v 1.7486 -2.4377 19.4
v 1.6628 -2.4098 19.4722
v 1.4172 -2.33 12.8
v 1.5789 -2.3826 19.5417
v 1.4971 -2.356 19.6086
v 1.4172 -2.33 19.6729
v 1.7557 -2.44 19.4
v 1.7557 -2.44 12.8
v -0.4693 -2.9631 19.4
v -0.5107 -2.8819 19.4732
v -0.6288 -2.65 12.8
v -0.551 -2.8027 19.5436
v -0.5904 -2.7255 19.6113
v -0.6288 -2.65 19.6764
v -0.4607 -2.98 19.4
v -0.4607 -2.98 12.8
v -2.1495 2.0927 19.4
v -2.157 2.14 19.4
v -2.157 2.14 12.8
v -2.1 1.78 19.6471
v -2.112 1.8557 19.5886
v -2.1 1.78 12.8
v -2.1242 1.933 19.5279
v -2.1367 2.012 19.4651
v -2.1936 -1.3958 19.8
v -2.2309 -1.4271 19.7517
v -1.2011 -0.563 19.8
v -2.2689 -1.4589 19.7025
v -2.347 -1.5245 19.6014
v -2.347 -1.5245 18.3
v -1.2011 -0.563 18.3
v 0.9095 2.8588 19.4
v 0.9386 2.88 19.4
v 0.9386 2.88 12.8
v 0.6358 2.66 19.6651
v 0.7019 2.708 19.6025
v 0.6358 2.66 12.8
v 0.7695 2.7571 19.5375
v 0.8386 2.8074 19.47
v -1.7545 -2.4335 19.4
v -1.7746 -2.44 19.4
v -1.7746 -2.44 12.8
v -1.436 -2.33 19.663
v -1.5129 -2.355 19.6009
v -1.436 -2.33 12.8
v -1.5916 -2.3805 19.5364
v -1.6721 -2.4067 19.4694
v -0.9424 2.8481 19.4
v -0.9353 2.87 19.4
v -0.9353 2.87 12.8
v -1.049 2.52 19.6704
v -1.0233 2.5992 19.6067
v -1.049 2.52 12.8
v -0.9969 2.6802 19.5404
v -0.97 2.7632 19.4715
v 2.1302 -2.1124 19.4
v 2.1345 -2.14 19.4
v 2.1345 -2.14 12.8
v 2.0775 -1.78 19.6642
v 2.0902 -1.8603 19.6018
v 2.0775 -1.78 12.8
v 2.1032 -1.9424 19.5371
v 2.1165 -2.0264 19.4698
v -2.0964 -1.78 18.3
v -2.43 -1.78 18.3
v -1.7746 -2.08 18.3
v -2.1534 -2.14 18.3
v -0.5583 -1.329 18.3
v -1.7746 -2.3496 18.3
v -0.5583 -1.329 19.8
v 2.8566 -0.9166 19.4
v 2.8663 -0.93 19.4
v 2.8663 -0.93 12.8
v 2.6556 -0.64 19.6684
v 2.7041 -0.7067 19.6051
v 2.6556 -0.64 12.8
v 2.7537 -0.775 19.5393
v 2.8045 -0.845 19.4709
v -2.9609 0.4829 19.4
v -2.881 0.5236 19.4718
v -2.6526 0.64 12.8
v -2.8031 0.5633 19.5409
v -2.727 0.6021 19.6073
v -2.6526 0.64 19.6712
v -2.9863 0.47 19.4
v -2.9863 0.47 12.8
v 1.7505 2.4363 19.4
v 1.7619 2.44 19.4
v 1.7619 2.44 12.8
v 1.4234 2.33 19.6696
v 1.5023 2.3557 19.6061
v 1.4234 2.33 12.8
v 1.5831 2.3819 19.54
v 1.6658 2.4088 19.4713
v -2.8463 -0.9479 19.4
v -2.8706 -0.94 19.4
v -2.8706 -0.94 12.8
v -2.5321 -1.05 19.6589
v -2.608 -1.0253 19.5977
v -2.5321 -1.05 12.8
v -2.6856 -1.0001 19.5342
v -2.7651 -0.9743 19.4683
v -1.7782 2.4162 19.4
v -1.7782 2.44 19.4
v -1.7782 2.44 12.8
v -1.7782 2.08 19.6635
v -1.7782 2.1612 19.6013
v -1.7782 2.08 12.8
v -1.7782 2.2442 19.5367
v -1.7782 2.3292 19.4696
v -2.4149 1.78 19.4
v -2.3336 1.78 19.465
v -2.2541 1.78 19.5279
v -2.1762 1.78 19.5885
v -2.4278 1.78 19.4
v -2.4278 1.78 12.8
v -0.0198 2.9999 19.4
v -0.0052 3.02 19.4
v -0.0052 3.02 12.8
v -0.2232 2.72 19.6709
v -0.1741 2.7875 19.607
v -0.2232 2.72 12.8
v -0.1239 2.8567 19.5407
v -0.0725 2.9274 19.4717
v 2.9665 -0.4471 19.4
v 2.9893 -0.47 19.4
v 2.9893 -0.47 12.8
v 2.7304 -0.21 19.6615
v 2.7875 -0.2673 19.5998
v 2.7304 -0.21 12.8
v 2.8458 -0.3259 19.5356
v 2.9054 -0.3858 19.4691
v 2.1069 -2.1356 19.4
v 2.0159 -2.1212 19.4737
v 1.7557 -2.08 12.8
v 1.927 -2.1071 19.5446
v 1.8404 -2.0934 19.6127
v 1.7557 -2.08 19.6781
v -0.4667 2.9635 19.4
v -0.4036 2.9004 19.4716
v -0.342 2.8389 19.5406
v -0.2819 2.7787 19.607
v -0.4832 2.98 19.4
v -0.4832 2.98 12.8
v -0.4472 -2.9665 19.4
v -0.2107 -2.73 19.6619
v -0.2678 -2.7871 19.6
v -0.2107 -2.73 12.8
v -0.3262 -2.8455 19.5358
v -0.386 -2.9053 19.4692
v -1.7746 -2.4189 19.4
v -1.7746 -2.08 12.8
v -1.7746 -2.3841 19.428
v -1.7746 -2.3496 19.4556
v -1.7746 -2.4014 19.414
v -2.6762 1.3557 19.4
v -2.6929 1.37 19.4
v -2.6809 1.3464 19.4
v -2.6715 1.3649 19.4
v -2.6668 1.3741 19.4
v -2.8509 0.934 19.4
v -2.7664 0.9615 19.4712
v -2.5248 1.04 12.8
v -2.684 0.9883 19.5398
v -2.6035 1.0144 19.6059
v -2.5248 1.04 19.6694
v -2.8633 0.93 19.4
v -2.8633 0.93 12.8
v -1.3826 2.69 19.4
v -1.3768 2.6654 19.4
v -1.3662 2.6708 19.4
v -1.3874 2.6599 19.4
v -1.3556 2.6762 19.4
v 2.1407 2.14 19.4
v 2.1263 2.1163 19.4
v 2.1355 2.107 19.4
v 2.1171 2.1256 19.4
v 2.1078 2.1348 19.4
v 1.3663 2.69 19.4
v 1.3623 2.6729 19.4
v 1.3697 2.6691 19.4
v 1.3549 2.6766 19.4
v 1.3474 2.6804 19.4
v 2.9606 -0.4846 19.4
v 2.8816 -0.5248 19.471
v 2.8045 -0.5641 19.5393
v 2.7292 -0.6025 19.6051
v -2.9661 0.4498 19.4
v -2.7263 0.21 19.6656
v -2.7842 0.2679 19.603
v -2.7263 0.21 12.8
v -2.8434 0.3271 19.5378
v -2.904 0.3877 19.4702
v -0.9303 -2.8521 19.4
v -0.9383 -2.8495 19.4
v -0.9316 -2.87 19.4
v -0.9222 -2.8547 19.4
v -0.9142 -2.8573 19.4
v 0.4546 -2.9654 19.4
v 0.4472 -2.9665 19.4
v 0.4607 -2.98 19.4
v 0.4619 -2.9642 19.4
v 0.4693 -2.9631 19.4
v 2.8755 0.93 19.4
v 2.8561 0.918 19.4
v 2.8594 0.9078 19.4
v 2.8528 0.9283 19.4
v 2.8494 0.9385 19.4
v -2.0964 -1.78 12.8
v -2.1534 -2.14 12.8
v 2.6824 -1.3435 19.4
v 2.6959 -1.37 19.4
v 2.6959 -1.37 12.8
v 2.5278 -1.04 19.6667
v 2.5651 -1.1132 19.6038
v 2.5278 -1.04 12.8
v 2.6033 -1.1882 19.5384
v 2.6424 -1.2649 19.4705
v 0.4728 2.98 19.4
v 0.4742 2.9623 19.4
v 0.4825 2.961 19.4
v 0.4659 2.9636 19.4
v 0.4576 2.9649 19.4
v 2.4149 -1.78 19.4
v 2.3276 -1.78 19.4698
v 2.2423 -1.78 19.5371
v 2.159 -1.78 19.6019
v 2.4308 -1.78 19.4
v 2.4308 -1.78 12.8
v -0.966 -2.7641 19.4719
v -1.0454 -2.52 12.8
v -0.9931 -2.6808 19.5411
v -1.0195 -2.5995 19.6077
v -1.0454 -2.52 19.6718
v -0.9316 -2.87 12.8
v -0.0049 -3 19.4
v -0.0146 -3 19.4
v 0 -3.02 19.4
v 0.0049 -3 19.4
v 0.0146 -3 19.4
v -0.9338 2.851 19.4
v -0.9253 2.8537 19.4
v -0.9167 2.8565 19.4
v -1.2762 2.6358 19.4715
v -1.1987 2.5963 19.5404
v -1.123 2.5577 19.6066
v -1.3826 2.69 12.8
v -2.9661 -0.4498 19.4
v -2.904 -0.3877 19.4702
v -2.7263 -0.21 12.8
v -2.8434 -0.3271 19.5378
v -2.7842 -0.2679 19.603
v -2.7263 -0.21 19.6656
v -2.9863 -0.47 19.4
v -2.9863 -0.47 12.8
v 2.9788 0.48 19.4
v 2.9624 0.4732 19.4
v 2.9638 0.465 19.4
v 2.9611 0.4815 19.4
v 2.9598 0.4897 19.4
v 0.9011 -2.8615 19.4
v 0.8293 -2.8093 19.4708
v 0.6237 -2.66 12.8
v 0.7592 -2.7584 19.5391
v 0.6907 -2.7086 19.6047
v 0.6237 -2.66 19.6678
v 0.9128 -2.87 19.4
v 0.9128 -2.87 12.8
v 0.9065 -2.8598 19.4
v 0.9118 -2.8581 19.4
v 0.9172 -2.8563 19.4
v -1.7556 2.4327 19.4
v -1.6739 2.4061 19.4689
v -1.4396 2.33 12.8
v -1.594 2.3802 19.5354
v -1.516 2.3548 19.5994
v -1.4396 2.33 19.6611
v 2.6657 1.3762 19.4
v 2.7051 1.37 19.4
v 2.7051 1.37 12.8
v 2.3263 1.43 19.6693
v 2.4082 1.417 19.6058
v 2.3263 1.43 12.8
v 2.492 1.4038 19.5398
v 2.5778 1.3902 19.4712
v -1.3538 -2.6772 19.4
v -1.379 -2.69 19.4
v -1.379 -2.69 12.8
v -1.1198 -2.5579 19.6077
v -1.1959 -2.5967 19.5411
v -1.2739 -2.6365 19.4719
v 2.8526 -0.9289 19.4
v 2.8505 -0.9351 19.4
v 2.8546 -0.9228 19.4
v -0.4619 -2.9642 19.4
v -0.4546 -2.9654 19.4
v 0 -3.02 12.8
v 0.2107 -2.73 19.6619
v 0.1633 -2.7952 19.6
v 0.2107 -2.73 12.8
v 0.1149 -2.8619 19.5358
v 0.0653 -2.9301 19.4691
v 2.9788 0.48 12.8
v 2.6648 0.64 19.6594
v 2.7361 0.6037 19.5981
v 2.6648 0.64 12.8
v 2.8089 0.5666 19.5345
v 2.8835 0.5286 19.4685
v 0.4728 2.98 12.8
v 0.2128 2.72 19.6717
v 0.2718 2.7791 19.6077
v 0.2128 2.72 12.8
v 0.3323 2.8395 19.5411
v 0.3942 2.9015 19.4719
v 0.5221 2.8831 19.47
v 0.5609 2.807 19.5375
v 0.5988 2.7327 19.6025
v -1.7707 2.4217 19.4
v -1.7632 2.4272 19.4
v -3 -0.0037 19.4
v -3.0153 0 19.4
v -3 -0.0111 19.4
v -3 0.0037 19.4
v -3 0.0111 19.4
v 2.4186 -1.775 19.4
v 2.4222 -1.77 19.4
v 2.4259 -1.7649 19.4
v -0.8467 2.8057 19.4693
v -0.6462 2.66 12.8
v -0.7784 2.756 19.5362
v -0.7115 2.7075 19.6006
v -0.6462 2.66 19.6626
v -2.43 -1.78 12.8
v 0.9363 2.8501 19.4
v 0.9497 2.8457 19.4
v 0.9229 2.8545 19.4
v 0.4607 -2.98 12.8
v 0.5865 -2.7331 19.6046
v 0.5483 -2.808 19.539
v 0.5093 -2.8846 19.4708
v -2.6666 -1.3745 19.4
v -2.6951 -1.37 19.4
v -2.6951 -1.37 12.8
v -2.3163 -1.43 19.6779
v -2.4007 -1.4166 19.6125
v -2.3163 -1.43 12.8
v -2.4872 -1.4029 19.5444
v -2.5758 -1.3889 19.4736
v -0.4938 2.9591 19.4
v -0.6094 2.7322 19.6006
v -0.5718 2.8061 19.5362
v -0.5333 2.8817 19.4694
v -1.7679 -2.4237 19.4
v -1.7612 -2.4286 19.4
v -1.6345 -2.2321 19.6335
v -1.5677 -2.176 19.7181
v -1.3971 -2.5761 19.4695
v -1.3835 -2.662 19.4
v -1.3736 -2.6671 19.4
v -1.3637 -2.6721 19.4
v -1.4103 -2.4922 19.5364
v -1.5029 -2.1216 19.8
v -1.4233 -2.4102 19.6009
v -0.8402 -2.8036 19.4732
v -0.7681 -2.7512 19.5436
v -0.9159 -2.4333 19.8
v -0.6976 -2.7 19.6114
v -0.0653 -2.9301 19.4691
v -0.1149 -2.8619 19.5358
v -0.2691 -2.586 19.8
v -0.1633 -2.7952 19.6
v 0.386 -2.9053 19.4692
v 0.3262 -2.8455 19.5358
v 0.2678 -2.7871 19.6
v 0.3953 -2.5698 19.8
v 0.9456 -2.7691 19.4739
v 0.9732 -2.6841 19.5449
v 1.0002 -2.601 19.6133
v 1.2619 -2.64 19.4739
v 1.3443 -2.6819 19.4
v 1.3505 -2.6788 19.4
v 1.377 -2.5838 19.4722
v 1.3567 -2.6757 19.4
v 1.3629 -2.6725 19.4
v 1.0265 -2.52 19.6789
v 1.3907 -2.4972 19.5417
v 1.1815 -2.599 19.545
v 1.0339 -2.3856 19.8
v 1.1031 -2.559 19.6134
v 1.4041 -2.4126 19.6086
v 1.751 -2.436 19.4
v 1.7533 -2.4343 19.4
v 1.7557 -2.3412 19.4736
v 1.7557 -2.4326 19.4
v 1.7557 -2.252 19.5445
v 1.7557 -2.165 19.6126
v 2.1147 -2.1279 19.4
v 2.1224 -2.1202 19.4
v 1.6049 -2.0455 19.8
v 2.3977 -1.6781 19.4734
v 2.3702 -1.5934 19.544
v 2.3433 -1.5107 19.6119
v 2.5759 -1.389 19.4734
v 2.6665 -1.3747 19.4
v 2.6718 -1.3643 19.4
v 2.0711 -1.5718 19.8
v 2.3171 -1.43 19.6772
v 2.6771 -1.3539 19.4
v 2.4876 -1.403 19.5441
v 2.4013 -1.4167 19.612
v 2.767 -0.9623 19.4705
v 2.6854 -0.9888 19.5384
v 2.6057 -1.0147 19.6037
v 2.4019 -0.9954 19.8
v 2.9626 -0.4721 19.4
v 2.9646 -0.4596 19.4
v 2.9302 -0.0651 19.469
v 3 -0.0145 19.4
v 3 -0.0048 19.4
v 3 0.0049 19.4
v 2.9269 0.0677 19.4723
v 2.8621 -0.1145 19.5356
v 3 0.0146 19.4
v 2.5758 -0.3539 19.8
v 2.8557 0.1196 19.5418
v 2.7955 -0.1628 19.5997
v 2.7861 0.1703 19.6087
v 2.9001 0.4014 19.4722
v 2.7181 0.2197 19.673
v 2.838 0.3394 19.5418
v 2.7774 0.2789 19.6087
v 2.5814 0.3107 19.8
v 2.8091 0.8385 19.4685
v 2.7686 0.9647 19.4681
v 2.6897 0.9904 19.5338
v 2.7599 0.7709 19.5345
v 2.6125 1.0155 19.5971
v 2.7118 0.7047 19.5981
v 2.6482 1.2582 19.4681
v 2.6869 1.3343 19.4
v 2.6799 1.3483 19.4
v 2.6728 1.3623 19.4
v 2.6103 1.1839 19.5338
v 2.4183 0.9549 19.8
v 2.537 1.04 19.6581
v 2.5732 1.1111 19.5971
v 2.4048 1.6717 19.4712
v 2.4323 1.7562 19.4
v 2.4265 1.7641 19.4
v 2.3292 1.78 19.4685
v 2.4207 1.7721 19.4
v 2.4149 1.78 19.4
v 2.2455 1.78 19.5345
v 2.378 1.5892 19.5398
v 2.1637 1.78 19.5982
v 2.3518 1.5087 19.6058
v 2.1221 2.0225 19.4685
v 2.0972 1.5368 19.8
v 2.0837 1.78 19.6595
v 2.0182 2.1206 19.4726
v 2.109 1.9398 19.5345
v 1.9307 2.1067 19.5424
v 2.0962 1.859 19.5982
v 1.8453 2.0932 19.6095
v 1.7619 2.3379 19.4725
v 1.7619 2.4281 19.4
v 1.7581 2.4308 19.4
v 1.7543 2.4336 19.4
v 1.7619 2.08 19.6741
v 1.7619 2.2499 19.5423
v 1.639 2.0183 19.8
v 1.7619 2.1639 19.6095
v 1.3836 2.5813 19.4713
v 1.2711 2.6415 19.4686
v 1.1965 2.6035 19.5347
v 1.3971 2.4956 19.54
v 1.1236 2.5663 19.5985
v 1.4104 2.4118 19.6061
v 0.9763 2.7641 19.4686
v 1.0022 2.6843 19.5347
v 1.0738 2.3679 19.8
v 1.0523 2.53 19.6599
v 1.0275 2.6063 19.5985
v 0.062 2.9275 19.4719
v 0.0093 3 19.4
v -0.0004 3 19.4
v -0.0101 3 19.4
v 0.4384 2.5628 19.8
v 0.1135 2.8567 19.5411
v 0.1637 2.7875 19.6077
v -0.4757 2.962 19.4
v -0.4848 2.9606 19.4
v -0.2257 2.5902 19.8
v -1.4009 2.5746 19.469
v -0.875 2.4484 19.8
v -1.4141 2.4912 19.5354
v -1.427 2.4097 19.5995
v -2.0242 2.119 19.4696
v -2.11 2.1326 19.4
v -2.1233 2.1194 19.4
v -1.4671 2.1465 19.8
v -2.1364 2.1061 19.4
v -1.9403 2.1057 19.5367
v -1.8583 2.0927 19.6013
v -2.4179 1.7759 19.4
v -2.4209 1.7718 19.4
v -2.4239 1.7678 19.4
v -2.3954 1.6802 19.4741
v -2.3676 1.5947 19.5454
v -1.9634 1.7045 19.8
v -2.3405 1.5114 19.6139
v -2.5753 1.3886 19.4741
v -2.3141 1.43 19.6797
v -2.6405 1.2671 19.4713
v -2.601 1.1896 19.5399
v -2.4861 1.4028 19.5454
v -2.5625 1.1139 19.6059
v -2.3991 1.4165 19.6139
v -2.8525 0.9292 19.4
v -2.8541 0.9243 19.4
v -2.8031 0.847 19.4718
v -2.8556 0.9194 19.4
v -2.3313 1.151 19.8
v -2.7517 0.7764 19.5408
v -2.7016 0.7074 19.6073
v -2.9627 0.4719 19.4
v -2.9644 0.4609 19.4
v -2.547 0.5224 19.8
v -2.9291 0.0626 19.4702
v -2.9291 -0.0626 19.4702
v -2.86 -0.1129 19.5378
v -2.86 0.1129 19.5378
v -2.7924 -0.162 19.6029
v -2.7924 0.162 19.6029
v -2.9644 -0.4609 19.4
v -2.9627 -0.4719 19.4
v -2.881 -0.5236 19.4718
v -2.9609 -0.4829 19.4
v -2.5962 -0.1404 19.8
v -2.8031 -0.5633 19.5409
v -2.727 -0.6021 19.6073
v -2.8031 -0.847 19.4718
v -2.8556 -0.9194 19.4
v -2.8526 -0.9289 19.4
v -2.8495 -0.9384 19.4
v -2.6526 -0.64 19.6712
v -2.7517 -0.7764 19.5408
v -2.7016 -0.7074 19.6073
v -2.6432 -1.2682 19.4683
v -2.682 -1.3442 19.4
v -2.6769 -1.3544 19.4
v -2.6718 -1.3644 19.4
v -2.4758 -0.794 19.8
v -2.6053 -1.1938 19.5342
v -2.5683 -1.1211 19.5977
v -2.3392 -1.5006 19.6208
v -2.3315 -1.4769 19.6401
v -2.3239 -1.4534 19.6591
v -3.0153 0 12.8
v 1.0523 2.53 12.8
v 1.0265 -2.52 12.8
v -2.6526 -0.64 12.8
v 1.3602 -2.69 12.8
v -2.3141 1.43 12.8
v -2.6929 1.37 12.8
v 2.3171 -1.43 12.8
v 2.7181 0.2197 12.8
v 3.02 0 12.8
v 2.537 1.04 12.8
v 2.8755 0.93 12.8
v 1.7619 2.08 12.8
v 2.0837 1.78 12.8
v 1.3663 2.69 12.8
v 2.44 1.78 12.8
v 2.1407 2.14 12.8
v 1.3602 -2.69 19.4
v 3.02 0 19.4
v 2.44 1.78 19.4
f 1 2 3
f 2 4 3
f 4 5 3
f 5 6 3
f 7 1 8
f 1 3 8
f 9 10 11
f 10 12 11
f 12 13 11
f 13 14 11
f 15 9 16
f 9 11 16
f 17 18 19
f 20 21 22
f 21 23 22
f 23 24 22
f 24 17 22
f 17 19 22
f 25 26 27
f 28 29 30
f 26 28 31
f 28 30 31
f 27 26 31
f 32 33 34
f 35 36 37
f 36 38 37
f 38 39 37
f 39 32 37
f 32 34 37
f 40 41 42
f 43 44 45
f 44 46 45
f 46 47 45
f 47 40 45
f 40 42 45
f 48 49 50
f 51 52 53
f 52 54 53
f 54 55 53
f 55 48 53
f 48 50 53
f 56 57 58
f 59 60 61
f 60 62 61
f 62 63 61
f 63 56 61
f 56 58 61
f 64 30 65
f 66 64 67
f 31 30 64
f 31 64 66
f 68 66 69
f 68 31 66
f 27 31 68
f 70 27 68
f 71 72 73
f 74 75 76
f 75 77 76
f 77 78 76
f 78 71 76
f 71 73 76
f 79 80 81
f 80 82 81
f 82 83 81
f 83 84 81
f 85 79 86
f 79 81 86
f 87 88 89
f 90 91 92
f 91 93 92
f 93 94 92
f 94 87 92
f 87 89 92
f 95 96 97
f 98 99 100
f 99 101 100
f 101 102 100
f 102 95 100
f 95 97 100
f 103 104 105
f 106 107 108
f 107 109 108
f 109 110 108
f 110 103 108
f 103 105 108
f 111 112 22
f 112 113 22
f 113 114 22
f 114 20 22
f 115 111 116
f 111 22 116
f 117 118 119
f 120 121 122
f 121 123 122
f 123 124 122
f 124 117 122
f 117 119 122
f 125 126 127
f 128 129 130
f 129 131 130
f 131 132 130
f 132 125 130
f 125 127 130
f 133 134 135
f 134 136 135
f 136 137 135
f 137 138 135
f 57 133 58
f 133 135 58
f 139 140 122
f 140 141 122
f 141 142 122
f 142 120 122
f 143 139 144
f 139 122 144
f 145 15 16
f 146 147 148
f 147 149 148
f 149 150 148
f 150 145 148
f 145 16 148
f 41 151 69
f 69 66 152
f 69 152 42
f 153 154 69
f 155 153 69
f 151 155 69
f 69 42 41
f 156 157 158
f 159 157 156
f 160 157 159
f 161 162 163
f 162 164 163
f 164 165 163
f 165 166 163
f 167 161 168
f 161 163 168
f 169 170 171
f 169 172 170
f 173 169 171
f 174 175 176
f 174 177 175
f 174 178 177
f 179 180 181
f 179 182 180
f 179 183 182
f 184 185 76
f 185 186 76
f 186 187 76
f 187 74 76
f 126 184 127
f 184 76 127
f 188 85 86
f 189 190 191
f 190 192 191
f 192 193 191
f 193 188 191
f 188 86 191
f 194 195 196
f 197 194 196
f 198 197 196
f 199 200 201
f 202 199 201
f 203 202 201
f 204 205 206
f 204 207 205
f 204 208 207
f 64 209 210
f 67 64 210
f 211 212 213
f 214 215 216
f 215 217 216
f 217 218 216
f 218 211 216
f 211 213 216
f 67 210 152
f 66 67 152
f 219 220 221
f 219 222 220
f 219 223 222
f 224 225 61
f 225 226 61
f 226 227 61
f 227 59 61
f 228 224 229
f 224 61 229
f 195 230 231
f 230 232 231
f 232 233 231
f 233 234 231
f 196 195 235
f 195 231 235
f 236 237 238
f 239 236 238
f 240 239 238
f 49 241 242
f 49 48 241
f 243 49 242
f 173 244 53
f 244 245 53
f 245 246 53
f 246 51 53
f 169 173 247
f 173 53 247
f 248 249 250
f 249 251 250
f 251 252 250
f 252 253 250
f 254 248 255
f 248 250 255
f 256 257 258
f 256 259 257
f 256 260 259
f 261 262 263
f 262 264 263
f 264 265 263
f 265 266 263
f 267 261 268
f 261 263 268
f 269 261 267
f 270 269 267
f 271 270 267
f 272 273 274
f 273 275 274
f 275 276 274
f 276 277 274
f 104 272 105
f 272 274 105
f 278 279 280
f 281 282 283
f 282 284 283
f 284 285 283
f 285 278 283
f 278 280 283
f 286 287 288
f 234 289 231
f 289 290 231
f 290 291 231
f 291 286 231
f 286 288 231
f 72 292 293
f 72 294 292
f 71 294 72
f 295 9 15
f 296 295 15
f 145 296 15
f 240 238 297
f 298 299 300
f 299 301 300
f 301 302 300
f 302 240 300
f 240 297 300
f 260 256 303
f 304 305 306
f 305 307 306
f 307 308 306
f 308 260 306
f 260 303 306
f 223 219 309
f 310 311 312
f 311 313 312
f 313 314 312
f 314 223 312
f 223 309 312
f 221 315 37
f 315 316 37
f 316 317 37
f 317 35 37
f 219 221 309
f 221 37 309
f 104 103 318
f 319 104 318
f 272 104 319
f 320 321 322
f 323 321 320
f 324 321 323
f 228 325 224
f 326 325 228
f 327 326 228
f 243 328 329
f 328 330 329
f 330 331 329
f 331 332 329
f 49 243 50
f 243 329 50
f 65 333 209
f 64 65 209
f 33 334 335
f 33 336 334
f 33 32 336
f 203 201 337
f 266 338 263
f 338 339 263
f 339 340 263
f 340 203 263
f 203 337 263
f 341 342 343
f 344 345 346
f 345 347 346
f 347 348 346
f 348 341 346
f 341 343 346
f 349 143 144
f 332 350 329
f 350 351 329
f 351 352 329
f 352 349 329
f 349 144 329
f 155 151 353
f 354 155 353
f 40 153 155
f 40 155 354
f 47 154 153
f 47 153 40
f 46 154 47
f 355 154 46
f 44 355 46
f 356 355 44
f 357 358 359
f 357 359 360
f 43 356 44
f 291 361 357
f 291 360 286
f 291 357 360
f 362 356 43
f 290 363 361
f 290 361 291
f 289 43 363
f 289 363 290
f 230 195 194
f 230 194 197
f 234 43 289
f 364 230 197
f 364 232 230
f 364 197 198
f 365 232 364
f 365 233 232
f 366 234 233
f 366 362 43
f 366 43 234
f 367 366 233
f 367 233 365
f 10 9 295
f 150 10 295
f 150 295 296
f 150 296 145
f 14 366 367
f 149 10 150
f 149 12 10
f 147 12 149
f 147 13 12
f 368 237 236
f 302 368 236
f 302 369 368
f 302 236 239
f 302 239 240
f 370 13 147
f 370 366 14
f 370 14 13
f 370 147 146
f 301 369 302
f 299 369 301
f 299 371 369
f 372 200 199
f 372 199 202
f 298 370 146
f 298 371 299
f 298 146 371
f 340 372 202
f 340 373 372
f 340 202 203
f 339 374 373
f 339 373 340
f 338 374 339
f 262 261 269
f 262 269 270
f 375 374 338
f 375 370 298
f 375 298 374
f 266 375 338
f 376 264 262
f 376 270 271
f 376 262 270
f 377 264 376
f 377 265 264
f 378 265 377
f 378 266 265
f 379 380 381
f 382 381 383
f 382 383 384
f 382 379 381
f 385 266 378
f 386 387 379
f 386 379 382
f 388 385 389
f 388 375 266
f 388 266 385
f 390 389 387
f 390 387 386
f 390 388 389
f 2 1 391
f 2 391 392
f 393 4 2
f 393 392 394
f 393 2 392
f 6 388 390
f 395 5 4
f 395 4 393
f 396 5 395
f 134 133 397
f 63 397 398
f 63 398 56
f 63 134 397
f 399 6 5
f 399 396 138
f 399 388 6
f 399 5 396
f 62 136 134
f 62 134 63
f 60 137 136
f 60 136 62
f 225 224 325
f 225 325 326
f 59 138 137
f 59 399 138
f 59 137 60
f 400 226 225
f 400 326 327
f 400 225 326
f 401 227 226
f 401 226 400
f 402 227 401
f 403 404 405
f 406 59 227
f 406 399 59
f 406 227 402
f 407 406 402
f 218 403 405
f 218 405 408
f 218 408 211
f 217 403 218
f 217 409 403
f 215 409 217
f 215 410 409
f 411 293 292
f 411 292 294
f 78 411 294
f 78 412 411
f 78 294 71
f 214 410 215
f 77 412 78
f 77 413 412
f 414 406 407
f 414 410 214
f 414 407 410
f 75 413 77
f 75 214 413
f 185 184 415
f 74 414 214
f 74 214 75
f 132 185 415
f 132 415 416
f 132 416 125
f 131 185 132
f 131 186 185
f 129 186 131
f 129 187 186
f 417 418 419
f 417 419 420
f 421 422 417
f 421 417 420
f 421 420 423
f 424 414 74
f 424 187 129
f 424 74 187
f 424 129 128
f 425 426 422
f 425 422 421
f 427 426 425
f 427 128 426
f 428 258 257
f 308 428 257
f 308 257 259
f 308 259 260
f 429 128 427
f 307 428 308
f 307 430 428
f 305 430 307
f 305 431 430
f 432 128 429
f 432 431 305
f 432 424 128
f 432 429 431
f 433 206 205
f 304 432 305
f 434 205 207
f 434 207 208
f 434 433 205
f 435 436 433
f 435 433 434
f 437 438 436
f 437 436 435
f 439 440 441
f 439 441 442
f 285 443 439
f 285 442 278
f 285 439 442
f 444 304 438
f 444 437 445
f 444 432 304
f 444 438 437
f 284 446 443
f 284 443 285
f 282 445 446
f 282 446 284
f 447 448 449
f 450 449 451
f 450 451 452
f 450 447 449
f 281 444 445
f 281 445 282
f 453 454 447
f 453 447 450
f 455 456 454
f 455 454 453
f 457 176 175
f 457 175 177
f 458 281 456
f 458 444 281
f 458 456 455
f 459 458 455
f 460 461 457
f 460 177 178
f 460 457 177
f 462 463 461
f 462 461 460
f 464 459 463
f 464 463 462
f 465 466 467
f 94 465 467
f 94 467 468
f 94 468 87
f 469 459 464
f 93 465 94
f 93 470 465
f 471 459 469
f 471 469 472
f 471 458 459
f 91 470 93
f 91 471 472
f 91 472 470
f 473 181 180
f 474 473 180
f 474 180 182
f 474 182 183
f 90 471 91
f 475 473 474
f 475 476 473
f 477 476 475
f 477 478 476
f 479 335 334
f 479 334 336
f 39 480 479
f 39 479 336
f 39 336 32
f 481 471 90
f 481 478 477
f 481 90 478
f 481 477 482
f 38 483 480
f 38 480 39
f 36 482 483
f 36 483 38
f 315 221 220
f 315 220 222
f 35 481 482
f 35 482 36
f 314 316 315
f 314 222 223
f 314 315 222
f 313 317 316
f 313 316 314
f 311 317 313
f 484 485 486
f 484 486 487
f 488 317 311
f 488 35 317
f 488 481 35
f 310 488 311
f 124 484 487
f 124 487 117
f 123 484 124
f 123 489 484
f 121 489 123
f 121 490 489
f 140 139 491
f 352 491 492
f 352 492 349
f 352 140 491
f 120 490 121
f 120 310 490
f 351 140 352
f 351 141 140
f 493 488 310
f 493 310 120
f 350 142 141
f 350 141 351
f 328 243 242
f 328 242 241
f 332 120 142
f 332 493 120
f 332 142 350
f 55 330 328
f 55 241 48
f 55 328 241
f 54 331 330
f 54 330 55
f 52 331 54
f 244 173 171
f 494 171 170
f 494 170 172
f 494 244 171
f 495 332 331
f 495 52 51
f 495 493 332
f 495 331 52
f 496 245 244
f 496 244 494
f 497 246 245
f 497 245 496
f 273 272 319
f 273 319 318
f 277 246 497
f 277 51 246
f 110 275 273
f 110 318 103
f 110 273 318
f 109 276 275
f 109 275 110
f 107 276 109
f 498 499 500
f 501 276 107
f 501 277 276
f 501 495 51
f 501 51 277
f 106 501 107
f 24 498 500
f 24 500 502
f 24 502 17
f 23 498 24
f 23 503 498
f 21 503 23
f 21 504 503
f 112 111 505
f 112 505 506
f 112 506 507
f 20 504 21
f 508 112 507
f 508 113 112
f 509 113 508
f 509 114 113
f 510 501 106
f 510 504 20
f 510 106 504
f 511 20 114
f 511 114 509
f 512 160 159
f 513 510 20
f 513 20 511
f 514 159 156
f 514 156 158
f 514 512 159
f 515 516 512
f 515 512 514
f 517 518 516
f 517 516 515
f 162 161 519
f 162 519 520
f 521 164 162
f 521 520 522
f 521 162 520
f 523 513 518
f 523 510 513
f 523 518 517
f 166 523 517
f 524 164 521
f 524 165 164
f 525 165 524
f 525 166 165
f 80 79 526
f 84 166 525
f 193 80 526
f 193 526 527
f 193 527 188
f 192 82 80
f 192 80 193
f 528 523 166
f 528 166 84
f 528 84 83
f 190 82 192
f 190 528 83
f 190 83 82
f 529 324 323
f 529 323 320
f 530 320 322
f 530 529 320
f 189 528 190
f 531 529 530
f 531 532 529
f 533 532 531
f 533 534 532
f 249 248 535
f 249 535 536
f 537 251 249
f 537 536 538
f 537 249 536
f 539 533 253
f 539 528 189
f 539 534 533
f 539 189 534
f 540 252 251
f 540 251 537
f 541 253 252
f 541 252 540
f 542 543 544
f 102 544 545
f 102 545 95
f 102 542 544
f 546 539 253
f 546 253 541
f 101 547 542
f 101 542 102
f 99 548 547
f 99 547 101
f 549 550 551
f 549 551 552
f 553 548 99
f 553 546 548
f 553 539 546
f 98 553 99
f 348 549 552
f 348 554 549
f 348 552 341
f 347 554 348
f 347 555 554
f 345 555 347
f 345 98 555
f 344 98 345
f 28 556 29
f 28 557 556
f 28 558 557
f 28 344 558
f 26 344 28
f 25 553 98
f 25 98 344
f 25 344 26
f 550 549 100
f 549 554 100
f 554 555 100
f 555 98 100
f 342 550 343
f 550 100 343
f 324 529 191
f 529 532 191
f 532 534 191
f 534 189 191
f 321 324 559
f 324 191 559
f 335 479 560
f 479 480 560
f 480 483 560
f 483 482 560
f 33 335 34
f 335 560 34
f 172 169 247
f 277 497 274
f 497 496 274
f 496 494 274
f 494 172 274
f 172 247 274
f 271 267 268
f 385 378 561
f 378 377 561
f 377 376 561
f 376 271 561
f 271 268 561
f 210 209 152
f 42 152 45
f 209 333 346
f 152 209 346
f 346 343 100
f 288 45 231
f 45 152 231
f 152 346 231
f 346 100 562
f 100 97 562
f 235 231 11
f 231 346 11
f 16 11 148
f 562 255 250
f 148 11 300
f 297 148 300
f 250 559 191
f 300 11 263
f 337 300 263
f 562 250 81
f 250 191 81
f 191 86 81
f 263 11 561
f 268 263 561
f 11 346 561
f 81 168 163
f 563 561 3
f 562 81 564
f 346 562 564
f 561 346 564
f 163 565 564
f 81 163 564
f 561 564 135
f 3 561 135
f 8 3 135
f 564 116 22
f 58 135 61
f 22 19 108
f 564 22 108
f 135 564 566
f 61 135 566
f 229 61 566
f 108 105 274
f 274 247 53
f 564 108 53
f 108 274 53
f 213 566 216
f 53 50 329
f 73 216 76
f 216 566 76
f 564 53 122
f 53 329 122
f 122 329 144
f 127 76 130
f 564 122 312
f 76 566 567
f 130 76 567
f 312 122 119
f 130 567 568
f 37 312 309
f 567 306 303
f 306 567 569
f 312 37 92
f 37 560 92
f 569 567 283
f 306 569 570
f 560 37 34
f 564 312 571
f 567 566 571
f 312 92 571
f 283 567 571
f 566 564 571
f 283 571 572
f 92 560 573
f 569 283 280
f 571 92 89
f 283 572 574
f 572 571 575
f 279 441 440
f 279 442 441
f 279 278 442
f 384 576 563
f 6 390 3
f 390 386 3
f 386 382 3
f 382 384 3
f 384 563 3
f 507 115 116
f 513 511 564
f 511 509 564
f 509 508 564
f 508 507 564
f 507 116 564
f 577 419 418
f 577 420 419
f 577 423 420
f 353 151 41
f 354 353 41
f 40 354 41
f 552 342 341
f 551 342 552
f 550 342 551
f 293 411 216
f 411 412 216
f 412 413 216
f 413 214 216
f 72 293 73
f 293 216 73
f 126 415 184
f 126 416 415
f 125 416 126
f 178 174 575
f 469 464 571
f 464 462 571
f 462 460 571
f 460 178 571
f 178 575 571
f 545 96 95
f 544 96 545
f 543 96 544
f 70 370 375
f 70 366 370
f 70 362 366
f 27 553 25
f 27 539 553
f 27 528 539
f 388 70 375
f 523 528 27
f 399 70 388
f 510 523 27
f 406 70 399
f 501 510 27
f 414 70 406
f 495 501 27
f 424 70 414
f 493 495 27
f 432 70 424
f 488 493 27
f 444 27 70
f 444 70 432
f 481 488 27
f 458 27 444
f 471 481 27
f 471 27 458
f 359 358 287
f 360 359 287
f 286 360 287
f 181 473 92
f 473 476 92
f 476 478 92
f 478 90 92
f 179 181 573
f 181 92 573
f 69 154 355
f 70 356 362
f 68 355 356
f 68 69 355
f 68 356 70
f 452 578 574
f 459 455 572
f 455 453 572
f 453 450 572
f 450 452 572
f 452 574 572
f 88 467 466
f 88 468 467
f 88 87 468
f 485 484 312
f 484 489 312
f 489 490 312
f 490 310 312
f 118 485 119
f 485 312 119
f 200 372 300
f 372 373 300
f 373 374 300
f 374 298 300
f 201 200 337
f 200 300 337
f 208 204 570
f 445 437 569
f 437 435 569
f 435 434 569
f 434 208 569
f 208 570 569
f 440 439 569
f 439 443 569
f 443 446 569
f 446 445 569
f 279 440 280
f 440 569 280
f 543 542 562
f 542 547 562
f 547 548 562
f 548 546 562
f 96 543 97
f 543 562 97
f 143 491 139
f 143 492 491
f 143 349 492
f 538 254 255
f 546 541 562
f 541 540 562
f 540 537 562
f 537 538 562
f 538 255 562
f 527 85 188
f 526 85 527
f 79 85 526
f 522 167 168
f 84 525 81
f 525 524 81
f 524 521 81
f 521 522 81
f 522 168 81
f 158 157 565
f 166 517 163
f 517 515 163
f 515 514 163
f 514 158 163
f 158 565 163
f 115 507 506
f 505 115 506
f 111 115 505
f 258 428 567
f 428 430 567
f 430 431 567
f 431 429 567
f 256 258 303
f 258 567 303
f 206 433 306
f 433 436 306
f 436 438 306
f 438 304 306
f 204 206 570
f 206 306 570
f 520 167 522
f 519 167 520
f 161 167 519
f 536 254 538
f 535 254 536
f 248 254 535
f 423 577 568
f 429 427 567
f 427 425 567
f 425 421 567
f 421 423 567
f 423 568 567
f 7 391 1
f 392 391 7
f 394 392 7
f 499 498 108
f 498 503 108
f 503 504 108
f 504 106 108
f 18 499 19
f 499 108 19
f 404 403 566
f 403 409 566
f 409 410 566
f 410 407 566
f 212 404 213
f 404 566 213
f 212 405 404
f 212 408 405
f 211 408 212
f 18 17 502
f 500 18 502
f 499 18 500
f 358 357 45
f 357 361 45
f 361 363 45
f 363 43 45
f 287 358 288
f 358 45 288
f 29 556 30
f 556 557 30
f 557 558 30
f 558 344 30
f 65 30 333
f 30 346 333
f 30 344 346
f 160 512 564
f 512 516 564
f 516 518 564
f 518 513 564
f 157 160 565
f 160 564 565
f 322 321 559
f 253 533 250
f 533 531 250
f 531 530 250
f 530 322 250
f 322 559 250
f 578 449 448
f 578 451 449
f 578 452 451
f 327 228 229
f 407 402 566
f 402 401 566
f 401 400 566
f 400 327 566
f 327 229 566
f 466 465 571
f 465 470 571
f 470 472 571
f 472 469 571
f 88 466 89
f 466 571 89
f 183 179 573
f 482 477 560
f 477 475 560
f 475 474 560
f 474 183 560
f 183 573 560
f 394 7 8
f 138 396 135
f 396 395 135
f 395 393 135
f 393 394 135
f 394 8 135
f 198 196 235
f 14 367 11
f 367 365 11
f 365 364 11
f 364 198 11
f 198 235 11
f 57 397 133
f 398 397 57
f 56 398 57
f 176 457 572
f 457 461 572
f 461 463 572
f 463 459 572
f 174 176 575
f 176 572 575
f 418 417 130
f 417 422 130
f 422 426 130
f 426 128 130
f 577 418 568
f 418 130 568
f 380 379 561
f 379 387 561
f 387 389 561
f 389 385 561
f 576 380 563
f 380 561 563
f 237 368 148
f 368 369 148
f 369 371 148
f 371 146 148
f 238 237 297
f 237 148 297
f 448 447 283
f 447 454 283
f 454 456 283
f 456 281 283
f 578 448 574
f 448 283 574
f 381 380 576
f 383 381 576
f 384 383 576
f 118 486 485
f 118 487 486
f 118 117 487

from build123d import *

# Parameters (mm, degrees)
CYLINDER_R          = 3.1
CYLINDER_DEPTH      = 0.4
BOX_W               = 1
BOX_H               = 1.8
BOX_DEPTH           = 1.5
BOX_PLACEMENT_ANGLE = 50
EXTRUDE_DEPTH       = 7


with BuildPart() as cone:
    # Cone → Cone (revolve)
    with BuildSketch(Plane(origin=(0, 0, 6.6), x_dir=(1, 0, 0), z_dir=(0, -1, 0))):
        Polygon((0, 0), (3, 0), (2.6, 0.4), (0, 0.4), align=None)
    revolve(axis=Axis((0, 0, 6.6), (0, 0, 1)))


with BuildPart() as cut001:
    # Cylinder → Cylinder (new body)
    with BuildSketch(Plane.XY.offset(6.6)):
        Circle(CYLINDER_R)
    extrude(amount=CYLINDER_DEPTH)

    # Cut001: cut Cone
    add(cone.part, mode=Mode.SUBTRACT)


with BuildPart() as cube:
    # Box → Box (new body)
    with BuildSketch(Plane.XY):
        with Locations((0.5, 0.9)):
            Rectangle(BOX_W, BOX_H)
    extrude(amount=BOX_DEPTH)


with BuildPart() as cube_1:
    # Box placement: moved
    add(cube.part.moved(Location((-2.58, -1.72, 5.5))).rotate(Axis((-2.58, -1.72, 5.5), (0, 0, -1)), BOX_PLACEMENT_ANGLE))


with BuildPart() as cut002:
    # Sketch → Extrude (new body)
    with BuildSketch(Plane.XY):
        Polygon((3.02, 0), (2.71811, 0.219739), (2.978825, 0.48), (2.664808, 0.64), (2.875505, 0.93), (2.53696, 1.04), (2.705103, 1.37), (2.326278, 1.43), (2.44, 1.78), (2.083712, 1.78), (2.14073, 2.14), (1.761905, 2.08), (1.761905, 2.44), (1.42336, 2.33), (1.366342, 2.69), (1.052324, 2.53), (0.938602, 2.88), (0.635798, 2.66), (0.47275, 2.98), (0.21275, 2.72), (-0.005213, 3.02), (-0.223176, 2.72), (-0.483176, 2.98), (-0.646224, 2.66), (-0.935264, 2.87), (-1.048986, 2.52), (-1.38263, 2.69), (-1.439648, 2.33), (-1.778193, 2.44), (-1.778193, 2.08), (-2.157018, 2.14), (-2.1, 1.78), (-2.42783, 1.78), (-2.314108, 1.43), (-2.692933, 1.37), (-2.52479, 1.04), (-2.863335, 0.93), (-2.652637, 0.64), (-2.986281, 0.47), (-2.726281, 0.21), (-3.015321, 0), (-2.726281, -0.21), (-2.986281, -0.47), (-2.652637, -0.64), (-2.8706, -0.94), (-2.532055, -1.05), (-2.695103, -1.37), (-2.316278, -1.43), (-2.43, -1.78), (-2.096381, -1.78), (-2.153399, -2.14), (-1.774574, -2.08), (-1.774574, -2.44), (-1.436029, -2.33), (-1.37901, -2.69), (-1.045367, -2.52), (-0.931645, -2.87), (-0.628841, -2.65), (-0.460697, -2.98), (-0.210697, -2.73), (0, -3.02), (0.210697, -2.73), (0.460697, -2.98), (0.623745, -2.66), (0.912786, -2.87), (1.026508, -2.52), (1.360151, -2.69), (1.41717, -2.33), (1.755715, -2.44), (1.755715, -2.08), (2.13454, -2.14), (2.077522, -1.78), (2.4308, -1.78), (2.317078, -1.43), (2.695903, -1.37), (2.52776, -1.04), (2.866305, -0.93), (2.655608, -0.64), (2.989252, -0.47), (2.730429, -0.21), align=None)
    extrude(amount=EXTRUDE_DEPTH)

    # Cut: cut Cube
    add(cube_1.part, mode=Mode.SUBTRACT)

    # Cut002: cut Cut001
    add(cut001.part, mode=Mode.SUBTRACT)


with BuildPart() as cut002_1:
    # Cut002 placement: moved
    add(cut002.part.moved(Location((0, 0, 12.8))))


solid = cut002_1.part
